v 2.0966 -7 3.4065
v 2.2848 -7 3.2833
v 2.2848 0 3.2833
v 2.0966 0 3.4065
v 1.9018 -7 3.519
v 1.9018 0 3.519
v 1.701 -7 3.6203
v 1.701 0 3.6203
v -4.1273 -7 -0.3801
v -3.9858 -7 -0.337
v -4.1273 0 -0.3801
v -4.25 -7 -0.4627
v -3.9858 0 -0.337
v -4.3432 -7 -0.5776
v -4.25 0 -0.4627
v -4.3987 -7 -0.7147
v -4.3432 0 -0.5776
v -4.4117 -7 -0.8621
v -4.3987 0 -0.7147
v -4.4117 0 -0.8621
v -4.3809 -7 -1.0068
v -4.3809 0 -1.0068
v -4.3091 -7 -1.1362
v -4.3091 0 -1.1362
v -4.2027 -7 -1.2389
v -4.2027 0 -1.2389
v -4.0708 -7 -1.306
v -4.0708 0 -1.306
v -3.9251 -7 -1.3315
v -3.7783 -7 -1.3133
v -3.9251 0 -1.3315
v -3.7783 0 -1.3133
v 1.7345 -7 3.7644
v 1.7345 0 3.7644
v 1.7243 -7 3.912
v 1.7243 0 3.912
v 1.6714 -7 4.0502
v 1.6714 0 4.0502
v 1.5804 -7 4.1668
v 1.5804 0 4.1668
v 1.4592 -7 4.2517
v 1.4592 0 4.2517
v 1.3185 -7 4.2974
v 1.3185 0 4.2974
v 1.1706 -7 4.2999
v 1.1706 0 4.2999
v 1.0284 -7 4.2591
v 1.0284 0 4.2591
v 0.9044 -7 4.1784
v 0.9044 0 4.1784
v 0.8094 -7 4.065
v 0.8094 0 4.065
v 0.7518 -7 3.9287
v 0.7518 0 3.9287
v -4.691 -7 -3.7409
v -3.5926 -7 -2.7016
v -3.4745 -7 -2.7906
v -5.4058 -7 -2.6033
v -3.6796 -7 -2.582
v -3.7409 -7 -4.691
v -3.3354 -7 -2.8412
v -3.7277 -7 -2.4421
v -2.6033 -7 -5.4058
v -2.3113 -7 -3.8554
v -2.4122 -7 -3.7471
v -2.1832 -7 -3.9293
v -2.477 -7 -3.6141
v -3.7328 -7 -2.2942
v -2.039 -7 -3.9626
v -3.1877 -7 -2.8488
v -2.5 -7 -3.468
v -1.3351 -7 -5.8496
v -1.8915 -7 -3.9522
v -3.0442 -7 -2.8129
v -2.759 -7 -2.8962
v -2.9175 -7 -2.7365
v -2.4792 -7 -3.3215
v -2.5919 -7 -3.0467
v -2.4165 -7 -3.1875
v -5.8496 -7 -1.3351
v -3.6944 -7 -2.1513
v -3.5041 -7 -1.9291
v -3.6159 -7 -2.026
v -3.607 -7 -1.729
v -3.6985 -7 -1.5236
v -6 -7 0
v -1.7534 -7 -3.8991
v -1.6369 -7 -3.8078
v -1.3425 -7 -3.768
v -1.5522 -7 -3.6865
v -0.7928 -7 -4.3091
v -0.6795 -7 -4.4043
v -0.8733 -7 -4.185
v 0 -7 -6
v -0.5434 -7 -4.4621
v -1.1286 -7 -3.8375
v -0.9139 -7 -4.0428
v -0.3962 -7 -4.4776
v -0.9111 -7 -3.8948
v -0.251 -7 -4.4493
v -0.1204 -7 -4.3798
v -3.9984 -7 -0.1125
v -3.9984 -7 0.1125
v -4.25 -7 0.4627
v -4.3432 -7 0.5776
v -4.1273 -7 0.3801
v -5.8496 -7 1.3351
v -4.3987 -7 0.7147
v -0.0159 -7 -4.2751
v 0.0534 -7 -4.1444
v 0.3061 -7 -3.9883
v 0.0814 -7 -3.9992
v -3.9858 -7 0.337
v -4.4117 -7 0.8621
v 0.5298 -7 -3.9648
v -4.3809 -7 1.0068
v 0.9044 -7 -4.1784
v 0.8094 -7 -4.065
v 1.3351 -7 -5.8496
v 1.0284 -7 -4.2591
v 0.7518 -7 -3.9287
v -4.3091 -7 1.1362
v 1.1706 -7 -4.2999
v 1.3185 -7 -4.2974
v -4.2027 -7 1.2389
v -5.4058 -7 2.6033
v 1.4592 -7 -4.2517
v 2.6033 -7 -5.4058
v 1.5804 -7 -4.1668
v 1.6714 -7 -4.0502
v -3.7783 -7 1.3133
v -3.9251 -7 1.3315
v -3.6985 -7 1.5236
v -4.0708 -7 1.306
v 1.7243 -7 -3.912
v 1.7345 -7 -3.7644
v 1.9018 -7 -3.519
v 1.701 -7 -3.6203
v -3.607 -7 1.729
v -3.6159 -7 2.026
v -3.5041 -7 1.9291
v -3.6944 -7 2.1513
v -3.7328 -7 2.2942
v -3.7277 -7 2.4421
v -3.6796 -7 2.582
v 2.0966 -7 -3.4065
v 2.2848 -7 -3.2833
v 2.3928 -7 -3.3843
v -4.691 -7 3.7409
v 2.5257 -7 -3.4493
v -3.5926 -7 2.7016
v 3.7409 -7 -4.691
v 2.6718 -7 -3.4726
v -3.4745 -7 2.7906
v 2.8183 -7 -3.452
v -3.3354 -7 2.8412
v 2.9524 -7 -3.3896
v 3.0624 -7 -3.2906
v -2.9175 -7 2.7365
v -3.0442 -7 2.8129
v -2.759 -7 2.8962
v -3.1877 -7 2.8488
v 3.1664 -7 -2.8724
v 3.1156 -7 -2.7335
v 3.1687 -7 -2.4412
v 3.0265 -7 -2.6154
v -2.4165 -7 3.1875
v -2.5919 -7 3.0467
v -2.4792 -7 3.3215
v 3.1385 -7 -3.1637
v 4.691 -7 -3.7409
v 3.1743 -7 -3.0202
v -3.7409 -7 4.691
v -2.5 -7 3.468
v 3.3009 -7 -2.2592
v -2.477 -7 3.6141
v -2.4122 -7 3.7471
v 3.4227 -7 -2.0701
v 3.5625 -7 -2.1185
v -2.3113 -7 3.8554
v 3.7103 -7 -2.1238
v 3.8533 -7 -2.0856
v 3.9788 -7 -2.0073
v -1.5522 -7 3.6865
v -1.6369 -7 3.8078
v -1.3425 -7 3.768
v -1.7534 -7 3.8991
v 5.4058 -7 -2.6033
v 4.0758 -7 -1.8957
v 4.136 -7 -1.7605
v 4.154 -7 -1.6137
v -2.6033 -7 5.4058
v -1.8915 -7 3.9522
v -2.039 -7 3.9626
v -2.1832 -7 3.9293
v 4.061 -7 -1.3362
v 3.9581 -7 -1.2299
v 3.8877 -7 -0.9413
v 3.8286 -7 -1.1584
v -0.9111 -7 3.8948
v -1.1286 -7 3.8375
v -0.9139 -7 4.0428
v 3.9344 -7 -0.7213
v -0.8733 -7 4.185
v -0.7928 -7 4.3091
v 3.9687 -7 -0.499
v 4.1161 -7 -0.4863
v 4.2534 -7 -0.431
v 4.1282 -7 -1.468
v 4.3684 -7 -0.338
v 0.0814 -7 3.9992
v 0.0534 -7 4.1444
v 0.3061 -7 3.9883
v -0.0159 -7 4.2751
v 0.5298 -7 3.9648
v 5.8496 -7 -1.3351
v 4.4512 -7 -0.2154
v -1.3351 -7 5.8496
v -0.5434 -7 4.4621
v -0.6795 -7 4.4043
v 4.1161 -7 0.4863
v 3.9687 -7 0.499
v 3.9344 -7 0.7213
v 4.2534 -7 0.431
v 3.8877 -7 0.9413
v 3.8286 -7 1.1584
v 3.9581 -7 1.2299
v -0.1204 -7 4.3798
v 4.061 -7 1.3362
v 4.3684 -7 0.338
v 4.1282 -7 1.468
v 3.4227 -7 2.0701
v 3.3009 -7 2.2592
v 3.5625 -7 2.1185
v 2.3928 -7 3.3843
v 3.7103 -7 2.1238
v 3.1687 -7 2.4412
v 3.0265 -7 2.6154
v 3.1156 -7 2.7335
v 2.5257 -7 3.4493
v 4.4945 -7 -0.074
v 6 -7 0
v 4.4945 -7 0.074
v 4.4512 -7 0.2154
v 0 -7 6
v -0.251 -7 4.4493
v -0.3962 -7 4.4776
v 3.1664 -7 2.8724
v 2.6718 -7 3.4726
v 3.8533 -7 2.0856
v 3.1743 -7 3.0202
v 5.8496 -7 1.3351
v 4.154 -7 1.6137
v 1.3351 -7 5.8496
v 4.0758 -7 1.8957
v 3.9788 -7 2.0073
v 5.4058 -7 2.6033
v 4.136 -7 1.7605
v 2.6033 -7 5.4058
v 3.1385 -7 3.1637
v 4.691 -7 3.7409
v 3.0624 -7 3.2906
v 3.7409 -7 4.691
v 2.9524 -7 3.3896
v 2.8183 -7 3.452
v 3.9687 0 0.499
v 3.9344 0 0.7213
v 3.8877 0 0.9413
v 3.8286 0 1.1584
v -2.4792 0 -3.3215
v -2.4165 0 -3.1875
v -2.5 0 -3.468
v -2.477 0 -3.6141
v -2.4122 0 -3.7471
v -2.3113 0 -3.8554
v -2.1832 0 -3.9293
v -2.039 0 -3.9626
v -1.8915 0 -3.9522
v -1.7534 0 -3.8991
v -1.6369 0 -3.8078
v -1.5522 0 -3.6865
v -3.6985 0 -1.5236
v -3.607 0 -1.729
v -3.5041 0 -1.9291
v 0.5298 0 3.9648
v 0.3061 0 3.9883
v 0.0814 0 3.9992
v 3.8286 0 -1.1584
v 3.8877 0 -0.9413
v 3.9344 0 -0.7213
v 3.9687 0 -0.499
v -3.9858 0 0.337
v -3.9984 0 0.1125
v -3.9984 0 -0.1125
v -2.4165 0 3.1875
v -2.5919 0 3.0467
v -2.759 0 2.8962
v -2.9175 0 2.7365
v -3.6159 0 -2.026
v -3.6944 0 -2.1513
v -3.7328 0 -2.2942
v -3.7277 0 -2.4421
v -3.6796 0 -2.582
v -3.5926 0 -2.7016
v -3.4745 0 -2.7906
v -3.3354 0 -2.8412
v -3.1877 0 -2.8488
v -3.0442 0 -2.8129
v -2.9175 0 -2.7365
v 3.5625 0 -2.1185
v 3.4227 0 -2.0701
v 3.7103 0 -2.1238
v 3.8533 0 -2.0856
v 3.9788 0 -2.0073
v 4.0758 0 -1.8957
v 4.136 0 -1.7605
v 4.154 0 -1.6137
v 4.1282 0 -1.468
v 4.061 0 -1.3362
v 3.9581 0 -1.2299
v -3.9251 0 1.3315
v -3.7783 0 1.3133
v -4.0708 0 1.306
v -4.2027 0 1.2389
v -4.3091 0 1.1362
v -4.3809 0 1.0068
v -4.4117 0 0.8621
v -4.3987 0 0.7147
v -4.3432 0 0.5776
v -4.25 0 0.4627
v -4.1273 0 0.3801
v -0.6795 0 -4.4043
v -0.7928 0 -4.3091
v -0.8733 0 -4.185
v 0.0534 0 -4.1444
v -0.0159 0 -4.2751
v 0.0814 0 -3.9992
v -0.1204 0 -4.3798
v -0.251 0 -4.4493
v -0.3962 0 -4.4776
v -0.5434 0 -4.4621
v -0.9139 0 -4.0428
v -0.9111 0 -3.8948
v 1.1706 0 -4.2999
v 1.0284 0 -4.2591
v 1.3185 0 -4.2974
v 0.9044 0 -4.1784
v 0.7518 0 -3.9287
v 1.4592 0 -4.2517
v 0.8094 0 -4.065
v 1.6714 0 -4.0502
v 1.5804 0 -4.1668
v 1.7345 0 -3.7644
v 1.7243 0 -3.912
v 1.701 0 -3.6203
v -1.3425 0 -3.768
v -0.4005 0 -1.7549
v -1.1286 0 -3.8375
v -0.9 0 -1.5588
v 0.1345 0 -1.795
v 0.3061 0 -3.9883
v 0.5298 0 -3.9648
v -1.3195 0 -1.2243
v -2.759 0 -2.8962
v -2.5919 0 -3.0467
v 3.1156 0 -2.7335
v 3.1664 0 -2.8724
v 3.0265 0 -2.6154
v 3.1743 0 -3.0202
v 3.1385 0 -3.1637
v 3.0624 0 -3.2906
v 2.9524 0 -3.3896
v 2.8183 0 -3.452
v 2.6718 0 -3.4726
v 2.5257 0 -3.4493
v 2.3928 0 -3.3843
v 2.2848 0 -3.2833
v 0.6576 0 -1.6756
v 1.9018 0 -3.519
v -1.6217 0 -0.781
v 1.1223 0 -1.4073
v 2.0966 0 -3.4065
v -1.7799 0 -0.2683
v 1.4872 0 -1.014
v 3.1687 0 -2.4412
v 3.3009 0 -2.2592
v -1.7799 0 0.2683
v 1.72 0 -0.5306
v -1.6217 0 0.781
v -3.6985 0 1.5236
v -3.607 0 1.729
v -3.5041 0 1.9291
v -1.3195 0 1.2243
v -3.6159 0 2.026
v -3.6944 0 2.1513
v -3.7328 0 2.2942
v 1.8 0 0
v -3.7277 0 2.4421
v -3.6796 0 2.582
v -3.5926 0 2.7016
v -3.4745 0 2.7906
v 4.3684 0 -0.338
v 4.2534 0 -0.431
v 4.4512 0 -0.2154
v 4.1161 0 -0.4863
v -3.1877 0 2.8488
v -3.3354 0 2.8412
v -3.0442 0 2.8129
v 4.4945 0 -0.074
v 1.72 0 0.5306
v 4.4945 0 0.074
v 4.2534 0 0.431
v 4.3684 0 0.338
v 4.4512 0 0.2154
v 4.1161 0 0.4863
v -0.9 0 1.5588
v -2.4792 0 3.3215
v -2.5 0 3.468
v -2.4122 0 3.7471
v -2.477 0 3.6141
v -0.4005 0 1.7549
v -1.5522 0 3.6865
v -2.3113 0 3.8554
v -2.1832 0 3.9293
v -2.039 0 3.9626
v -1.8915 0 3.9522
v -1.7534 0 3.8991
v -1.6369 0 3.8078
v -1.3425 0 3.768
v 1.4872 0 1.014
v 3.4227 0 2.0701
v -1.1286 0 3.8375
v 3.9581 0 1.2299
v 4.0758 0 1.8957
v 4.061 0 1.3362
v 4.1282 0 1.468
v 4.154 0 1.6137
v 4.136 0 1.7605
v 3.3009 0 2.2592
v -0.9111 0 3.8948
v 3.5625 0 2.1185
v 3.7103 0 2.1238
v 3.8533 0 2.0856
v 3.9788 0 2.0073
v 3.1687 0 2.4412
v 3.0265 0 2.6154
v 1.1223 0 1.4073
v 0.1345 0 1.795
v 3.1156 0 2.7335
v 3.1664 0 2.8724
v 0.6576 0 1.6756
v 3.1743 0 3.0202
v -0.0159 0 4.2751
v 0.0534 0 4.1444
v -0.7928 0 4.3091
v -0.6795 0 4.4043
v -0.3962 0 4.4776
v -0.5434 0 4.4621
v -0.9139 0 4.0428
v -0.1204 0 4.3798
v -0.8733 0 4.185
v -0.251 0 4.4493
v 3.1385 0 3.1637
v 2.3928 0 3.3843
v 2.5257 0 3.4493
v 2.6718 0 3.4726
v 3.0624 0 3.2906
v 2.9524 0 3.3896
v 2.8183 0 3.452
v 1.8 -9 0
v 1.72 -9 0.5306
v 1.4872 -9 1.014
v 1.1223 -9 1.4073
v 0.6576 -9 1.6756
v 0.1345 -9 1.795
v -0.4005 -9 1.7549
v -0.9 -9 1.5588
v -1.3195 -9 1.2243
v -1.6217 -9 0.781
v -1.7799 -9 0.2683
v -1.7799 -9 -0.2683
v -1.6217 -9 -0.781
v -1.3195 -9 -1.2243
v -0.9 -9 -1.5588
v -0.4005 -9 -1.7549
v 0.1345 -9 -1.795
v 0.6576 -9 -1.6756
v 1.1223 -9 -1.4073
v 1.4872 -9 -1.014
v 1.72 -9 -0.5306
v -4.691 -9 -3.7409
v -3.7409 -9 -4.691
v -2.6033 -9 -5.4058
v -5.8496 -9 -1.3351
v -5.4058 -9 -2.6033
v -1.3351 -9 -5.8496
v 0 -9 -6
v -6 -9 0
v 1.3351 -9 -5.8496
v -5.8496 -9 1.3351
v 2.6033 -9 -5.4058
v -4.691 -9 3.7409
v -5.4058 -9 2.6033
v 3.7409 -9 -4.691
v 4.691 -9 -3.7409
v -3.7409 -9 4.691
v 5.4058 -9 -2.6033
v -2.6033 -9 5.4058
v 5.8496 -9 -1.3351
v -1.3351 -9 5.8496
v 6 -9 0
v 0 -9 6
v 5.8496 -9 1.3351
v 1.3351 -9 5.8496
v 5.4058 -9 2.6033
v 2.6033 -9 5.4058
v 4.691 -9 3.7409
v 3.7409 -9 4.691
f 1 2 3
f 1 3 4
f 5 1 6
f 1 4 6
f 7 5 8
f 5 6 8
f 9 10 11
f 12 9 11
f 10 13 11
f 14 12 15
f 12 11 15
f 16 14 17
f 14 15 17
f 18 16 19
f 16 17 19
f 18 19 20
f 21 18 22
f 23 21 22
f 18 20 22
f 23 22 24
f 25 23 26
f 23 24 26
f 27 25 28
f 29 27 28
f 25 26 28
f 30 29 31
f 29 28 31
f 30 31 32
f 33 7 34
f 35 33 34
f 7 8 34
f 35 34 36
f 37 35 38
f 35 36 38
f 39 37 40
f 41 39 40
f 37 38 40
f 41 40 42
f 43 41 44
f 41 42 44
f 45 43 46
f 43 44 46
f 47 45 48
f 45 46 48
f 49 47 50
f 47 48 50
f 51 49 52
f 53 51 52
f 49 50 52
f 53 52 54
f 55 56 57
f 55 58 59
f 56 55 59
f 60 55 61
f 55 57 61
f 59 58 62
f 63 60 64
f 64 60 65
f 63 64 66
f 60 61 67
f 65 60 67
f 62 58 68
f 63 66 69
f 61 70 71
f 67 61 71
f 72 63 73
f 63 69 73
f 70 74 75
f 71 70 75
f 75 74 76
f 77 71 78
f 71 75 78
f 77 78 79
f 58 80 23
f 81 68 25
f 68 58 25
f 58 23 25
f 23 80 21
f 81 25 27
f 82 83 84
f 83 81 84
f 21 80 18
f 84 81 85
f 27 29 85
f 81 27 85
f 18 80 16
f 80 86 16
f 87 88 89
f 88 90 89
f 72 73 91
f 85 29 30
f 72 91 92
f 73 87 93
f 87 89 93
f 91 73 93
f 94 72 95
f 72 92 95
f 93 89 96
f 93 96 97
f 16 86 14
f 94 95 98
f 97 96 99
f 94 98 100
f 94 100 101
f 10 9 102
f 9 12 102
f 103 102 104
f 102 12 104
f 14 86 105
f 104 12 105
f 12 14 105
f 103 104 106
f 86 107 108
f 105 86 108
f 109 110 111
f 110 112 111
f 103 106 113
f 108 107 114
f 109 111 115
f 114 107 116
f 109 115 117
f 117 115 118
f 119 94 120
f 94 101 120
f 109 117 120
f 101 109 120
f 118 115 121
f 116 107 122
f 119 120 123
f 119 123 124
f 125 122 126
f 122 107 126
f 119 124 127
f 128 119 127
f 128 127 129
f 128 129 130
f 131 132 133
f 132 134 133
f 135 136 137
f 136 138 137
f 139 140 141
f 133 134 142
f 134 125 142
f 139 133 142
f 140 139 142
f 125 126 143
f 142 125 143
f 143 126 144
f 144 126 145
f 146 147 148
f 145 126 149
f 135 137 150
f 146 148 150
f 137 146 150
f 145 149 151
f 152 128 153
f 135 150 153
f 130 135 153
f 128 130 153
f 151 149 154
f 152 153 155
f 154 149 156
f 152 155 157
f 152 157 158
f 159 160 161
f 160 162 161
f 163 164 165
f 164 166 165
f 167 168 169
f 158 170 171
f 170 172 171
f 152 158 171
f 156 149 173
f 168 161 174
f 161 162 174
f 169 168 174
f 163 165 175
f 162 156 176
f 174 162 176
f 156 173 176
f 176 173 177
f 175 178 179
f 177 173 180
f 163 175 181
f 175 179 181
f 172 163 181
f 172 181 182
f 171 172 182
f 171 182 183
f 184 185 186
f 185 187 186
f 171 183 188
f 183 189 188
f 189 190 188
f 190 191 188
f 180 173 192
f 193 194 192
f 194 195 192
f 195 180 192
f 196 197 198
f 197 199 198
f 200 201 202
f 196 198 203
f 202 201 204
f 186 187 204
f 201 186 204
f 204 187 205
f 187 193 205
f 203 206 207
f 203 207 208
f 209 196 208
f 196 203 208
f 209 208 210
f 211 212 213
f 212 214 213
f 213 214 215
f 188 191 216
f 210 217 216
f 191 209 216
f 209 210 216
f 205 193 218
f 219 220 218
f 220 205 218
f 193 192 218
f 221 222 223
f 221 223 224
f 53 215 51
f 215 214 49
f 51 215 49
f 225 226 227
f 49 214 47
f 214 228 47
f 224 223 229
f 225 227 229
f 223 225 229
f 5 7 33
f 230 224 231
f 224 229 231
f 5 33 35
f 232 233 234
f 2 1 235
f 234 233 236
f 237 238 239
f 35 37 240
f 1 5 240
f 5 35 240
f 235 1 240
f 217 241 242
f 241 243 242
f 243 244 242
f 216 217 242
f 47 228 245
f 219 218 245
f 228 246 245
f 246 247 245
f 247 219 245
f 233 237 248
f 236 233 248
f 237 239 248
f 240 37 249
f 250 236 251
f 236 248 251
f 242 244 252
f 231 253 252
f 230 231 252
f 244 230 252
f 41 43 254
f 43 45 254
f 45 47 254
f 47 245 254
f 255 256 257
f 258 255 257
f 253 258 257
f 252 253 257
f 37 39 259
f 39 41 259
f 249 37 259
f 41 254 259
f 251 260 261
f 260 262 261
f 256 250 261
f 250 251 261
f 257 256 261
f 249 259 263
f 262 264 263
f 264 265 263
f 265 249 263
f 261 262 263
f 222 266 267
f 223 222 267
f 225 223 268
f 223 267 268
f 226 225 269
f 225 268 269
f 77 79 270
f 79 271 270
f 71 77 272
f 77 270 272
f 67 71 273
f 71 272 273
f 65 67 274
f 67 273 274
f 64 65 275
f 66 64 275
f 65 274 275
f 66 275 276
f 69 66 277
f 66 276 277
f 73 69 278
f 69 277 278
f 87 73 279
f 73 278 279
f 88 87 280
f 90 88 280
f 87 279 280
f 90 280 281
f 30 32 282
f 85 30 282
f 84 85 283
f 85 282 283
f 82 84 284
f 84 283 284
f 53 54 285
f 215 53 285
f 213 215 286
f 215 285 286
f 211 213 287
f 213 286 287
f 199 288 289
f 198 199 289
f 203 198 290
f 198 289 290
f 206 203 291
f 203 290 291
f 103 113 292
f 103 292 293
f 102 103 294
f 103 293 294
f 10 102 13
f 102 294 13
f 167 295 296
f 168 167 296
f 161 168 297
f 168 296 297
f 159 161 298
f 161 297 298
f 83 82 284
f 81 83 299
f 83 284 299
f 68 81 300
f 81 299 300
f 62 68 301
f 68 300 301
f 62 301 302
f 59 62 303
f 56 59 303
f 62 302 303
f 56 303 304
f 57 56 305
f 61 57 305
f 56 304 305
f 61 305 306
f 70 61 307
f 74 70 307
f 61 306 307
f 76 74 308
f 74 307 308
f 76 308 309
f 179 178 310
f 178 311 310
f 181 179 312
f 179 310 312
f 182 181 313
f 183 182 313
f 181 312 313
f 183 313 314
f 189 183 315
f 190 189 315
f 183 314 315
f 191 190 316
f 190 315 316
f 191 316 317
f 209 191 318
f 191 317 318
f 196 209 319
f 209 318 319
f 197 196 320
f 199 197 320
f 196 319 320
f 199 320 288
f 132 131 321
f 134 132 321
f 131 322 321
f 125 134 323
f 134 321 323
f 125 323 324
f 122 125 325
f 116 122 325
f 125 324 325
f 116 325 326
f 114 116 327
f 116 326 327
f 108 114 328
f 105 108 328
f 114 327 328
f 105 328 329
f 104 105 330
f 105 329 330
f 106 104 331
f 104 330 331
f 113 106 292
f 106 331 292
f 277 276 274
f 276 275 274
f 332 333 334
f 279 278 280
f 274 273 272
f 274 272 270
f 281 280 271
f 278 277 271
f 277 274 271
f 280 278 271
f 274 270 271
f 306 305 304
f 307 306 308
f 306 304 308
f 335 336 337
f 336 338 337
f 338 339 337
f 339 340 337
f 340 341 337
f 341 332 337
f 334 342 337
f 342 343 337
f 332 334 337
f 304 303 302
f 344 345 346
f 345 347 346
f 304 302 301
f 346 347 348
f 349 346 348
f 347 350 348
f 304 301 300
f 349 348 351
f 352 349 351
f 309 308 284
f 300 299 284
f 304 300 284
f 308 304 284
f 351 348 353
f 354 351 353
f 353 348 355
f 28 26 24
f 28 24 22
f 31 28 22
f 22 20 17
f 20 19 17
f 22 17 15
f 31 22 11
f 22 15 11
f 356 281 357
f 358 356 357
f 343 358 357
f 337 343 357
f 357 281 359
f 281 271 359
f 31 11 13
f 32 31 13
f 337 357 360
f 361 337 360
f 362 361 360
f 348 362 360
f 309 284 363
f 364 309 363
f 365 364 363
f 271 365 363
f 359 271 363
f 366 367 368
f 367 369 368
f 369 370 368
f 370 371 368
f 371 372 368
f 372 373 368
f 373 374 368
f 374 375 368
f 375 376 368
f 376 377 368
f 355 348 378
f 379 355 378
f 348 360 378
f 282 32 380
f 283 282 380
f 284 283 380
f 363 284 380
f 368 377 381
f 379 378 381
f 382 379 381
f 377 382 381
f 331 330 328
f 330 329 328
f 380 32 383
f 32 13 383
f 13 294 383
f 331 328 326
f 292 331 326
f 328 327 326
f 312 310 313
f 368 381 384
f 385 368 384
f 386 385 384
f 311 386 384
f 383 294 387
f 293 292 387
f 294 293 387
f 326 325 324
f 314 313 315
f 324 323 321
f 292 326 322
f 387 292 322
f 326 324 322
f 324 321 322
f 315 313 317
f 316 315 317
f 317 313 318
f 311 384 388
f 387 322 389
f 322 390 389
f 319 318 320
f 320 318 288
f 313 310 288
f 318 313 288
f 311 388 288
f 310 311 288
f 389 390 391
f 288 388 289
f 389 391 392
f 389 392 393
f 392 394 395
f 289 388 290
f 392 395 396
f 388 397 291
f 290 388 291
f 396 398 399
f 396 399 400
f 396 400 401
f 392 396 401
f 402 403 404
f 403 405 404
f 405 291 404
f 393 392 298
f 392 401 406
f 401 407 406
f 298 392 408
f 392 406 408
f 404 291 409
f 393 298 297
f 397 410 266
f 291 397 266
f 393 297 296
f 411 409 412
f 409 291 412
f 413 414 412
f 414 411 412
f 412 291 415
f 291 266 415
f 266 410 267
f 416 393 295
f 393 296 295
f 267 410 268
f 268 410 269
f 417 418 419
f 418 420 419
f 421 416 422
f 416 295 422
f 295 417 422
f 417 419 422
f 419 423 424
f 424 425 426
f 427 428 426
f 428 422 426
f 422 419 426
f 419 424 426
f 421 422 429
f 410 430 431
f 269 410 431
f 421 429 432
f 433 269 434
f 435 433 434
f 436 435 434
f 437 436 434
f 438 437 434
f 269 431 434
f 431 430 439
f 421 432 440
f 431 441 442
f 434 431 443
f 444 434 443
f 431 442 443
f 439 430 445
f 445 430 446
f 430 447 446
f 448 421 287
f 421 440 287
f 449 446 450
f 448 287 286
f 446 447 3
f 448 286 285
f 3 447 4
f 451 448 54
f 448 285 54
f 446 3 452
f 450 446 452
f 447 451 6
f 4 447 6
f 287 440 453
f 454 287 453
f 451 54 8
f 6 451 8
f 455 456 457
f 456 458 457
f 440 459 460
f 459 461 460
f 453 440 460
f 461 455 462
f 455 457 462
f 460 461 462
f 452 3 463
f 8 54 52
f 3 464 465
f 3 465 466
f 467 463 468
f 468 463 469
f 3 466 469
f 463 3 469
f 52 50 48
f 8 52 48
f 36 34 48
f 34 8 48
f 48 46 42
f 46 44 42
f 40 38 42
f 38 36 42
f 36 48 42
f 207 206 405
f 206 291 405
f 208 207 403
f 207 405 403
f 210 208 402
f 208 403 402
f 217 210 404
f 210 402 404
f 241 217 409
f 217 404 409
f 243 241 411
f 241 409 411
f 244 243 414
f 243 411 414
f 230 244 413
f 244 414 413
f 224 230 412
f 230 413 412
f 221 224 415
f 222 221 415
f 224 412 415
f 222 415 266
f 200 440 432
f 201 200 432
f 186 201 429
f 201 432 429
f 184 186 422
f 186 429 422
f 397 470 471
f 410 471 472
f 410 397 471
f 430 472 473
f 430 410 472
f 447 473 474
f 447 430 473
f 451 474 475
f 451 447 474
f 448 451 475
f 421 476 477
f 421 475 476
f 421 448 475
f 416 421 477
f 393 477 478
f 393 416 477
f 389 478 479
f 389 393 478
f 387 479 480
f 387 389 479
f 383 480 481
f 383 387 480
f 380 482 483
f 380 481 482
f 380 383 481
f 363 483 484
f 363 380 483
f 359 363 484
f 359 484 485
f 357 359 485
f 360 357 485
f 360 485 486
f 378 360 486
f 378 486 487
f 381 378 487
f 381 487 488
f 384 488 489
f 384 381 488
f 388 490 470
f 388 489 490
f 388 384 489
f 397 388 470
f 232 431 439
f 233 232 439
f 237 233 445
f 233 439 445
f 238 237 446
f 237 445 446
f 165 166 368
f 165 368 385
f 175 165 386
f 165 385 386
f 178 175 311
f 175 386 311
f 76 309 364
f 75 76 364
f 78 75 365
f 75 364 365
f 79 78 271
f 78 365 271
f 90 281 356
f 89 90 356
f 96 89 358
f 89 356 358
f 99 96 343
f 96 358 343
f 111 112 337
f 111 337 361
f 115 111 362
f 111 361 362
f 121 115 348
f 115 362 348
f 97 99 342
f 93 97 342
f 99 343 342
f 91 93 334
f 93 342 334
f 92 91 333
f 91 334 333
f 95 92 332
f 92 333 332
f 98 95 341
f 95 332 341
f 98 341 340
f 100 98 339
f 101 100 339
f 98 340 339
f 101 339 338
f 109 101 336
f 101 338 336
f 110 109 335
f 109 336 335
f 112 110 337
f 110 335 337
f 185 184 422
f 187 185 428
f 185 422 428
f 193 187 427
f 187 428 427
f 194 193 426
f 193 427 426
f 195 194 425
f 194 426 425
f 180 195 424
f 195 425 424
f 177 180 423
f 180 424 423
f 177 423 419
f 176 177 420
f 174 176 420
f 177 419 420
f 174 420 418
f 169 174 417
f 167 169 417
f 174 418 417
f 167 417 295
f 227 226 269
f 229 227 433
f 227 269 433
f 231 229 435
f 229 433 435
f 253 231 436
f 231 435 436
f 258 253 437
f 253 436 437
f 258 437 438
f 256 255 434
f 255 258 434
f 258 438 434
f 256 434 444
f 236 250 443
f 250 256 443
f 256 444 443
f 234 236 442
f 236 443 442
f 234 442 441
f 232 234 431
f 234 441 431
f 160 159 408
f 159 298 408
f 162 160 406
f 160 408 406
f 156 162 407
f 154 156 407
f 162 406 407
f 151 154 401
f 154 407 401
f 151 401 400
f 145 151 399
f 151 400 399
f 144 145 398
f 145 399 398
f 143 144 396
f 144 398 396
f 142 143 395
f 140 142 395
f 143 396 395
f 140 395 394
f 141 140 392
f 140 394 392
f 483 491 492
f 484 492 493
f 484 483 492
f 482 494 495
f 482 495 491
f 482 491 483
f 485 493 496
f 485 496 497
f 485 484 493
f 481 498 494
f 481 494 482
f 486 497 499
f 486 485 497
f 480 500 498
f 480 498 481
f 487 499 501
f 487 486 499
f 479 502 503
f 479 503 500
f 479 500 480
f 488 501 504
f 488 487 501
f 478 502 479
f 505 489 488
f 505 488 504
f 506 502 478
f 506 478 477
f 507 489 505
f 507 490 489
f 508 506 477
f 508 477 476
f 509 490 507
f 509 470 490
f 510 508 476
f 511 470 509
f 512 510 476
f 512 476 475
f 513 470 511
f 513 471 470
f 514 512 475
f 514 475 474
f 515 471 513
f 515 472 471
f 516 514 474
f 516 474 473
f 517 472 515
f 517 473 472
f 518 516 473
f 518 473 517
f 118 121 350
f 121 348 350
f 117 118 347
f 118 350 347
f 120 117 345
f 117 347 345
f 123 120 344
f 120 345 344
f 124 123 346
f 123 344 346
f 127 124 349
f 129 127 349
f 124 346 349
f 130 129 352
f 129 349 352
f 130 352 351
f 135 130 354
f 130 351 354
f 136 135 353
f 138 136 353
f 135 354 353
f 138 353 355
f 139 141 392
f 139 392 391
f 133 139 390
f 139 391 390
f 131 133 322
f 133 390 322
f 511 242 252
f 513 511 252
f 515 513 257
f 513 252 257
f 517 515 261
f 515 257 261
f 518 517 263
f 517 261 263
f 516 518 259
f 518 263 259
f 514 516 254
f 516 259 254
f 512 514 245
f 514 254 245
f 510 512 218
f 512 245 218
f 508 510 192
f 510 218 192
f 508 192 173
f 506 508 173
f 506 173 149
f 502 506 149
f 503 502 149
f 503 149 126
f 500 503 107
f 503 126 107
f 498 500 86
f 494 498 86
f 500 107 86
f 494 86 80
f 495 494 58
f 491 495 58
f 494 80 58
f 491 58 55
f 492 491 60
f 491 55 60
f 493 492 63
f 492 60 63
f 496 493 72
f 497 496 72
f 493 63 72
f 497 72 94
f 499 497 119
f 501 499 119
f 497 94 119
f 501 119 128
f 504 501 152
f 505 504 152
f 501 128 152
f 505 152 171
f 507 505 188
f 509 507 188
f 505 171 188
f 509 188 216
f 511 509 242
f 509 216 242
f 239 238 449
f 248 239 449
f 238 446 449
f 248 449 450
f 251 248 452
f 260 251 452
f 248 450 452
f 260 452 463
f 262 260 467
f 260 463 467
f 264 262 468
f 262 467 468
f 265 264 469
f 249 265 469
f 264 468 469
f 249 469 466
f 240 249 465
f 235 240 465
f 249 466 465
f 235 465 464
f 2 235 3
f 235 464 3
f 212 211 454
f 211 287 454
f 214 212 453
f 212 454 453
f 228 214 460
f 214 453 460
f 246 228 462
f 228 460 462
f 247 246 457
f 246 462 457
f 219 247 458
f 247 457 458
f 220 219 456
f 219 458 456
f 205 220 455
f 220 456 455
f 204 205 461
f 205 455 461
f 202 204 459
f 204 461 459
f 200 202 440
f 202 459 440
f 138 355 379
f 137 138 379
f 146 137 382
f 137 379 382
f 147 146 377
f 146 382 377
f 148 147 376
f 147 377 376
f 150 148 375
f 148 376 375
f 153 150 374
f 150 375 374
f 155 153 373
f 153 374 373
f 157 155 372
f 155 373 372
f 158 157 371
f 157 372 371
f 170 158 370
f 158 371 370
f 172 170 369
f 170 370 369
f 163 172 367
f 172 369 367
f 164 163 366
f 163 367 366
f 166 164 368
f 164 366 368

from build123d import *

# Parameters (mm, degrees)
CYLINDER011034_R     = 1.8
CYLINDER011034_DEPTH = 20
CYLINDER011033_R     = 6
CYLINDER011033_DEPTH = 2
CYLINDER011035_R     = 0.5
CYLINDER011035_DEPTH = 7
ARRAY018_COUNT       = 15
CYLINDER011032_R     = 4
CYLINDER011032_DEPTH = 7


with BuildPart() as belt_attach_bolt_hole001:
    # Cylinder011034 → Cylinder011034 (new body)
    with BuildSketch(Plane.XZ):
        Circle(CYLINDER011034_R)
    extrude(amount=CYLINDER011034_DEPTH)


with BuildPart() as belt_disk001:
    # Cylinder011033 → Cylinder011033 (new body)
    with BuildSketch(Plane.XZ.offset(7)):
        Circle(CYLINDER011033_R)
    extrude(amount=CYLINDER011033_DEPTH)


with BuildPart() as belt_pin_array001:
    # Cylinder011035 → Cylinder011035 (new body)
    with BuildSketch(Plane(origin=(4, 0, 0), x_dir=(1, 0, 0), z_dir=(0, -1, 0))):
        Circle(CYLINDER011035_R)
    extrude(amount=CYLINDER011035_DEPTH)

    # Array018: belt pin array001 ×15 about axis
    array018_axis = Axis((0, 0, 0), (0, 1, 0))


with BuildPart() as belt_pin_array001_1:
    add(belt_pin_array001.part)
    for i in range(1, ARRAY018_COUNT):
        add(belt_pin_array001.part.rotate(array018_axis, i * 360 / ARRAY018_COUNT))


with BuildPart() as horizontal_belt_attach_cut:
    # Cylinder011032 → Cylinder011032 (new body)
    with BuildSketch(Plane.XZ):
        Circle(CYLINDER011032_R)
    extrude(amount=CYLINDER011032_DEPTH)

    # Fusion012: union belt disk001, belt pin array001
    add(belt_disk001.part)
    add(belt_pin_array001_1.part)

    # Cut023015009022: cut belt attach bolt hole001
    add(belt_attach_bolt_hole001.part, mode=Mode.SUBTRACT)


solid = horizontal_belt_attach_cut.part
